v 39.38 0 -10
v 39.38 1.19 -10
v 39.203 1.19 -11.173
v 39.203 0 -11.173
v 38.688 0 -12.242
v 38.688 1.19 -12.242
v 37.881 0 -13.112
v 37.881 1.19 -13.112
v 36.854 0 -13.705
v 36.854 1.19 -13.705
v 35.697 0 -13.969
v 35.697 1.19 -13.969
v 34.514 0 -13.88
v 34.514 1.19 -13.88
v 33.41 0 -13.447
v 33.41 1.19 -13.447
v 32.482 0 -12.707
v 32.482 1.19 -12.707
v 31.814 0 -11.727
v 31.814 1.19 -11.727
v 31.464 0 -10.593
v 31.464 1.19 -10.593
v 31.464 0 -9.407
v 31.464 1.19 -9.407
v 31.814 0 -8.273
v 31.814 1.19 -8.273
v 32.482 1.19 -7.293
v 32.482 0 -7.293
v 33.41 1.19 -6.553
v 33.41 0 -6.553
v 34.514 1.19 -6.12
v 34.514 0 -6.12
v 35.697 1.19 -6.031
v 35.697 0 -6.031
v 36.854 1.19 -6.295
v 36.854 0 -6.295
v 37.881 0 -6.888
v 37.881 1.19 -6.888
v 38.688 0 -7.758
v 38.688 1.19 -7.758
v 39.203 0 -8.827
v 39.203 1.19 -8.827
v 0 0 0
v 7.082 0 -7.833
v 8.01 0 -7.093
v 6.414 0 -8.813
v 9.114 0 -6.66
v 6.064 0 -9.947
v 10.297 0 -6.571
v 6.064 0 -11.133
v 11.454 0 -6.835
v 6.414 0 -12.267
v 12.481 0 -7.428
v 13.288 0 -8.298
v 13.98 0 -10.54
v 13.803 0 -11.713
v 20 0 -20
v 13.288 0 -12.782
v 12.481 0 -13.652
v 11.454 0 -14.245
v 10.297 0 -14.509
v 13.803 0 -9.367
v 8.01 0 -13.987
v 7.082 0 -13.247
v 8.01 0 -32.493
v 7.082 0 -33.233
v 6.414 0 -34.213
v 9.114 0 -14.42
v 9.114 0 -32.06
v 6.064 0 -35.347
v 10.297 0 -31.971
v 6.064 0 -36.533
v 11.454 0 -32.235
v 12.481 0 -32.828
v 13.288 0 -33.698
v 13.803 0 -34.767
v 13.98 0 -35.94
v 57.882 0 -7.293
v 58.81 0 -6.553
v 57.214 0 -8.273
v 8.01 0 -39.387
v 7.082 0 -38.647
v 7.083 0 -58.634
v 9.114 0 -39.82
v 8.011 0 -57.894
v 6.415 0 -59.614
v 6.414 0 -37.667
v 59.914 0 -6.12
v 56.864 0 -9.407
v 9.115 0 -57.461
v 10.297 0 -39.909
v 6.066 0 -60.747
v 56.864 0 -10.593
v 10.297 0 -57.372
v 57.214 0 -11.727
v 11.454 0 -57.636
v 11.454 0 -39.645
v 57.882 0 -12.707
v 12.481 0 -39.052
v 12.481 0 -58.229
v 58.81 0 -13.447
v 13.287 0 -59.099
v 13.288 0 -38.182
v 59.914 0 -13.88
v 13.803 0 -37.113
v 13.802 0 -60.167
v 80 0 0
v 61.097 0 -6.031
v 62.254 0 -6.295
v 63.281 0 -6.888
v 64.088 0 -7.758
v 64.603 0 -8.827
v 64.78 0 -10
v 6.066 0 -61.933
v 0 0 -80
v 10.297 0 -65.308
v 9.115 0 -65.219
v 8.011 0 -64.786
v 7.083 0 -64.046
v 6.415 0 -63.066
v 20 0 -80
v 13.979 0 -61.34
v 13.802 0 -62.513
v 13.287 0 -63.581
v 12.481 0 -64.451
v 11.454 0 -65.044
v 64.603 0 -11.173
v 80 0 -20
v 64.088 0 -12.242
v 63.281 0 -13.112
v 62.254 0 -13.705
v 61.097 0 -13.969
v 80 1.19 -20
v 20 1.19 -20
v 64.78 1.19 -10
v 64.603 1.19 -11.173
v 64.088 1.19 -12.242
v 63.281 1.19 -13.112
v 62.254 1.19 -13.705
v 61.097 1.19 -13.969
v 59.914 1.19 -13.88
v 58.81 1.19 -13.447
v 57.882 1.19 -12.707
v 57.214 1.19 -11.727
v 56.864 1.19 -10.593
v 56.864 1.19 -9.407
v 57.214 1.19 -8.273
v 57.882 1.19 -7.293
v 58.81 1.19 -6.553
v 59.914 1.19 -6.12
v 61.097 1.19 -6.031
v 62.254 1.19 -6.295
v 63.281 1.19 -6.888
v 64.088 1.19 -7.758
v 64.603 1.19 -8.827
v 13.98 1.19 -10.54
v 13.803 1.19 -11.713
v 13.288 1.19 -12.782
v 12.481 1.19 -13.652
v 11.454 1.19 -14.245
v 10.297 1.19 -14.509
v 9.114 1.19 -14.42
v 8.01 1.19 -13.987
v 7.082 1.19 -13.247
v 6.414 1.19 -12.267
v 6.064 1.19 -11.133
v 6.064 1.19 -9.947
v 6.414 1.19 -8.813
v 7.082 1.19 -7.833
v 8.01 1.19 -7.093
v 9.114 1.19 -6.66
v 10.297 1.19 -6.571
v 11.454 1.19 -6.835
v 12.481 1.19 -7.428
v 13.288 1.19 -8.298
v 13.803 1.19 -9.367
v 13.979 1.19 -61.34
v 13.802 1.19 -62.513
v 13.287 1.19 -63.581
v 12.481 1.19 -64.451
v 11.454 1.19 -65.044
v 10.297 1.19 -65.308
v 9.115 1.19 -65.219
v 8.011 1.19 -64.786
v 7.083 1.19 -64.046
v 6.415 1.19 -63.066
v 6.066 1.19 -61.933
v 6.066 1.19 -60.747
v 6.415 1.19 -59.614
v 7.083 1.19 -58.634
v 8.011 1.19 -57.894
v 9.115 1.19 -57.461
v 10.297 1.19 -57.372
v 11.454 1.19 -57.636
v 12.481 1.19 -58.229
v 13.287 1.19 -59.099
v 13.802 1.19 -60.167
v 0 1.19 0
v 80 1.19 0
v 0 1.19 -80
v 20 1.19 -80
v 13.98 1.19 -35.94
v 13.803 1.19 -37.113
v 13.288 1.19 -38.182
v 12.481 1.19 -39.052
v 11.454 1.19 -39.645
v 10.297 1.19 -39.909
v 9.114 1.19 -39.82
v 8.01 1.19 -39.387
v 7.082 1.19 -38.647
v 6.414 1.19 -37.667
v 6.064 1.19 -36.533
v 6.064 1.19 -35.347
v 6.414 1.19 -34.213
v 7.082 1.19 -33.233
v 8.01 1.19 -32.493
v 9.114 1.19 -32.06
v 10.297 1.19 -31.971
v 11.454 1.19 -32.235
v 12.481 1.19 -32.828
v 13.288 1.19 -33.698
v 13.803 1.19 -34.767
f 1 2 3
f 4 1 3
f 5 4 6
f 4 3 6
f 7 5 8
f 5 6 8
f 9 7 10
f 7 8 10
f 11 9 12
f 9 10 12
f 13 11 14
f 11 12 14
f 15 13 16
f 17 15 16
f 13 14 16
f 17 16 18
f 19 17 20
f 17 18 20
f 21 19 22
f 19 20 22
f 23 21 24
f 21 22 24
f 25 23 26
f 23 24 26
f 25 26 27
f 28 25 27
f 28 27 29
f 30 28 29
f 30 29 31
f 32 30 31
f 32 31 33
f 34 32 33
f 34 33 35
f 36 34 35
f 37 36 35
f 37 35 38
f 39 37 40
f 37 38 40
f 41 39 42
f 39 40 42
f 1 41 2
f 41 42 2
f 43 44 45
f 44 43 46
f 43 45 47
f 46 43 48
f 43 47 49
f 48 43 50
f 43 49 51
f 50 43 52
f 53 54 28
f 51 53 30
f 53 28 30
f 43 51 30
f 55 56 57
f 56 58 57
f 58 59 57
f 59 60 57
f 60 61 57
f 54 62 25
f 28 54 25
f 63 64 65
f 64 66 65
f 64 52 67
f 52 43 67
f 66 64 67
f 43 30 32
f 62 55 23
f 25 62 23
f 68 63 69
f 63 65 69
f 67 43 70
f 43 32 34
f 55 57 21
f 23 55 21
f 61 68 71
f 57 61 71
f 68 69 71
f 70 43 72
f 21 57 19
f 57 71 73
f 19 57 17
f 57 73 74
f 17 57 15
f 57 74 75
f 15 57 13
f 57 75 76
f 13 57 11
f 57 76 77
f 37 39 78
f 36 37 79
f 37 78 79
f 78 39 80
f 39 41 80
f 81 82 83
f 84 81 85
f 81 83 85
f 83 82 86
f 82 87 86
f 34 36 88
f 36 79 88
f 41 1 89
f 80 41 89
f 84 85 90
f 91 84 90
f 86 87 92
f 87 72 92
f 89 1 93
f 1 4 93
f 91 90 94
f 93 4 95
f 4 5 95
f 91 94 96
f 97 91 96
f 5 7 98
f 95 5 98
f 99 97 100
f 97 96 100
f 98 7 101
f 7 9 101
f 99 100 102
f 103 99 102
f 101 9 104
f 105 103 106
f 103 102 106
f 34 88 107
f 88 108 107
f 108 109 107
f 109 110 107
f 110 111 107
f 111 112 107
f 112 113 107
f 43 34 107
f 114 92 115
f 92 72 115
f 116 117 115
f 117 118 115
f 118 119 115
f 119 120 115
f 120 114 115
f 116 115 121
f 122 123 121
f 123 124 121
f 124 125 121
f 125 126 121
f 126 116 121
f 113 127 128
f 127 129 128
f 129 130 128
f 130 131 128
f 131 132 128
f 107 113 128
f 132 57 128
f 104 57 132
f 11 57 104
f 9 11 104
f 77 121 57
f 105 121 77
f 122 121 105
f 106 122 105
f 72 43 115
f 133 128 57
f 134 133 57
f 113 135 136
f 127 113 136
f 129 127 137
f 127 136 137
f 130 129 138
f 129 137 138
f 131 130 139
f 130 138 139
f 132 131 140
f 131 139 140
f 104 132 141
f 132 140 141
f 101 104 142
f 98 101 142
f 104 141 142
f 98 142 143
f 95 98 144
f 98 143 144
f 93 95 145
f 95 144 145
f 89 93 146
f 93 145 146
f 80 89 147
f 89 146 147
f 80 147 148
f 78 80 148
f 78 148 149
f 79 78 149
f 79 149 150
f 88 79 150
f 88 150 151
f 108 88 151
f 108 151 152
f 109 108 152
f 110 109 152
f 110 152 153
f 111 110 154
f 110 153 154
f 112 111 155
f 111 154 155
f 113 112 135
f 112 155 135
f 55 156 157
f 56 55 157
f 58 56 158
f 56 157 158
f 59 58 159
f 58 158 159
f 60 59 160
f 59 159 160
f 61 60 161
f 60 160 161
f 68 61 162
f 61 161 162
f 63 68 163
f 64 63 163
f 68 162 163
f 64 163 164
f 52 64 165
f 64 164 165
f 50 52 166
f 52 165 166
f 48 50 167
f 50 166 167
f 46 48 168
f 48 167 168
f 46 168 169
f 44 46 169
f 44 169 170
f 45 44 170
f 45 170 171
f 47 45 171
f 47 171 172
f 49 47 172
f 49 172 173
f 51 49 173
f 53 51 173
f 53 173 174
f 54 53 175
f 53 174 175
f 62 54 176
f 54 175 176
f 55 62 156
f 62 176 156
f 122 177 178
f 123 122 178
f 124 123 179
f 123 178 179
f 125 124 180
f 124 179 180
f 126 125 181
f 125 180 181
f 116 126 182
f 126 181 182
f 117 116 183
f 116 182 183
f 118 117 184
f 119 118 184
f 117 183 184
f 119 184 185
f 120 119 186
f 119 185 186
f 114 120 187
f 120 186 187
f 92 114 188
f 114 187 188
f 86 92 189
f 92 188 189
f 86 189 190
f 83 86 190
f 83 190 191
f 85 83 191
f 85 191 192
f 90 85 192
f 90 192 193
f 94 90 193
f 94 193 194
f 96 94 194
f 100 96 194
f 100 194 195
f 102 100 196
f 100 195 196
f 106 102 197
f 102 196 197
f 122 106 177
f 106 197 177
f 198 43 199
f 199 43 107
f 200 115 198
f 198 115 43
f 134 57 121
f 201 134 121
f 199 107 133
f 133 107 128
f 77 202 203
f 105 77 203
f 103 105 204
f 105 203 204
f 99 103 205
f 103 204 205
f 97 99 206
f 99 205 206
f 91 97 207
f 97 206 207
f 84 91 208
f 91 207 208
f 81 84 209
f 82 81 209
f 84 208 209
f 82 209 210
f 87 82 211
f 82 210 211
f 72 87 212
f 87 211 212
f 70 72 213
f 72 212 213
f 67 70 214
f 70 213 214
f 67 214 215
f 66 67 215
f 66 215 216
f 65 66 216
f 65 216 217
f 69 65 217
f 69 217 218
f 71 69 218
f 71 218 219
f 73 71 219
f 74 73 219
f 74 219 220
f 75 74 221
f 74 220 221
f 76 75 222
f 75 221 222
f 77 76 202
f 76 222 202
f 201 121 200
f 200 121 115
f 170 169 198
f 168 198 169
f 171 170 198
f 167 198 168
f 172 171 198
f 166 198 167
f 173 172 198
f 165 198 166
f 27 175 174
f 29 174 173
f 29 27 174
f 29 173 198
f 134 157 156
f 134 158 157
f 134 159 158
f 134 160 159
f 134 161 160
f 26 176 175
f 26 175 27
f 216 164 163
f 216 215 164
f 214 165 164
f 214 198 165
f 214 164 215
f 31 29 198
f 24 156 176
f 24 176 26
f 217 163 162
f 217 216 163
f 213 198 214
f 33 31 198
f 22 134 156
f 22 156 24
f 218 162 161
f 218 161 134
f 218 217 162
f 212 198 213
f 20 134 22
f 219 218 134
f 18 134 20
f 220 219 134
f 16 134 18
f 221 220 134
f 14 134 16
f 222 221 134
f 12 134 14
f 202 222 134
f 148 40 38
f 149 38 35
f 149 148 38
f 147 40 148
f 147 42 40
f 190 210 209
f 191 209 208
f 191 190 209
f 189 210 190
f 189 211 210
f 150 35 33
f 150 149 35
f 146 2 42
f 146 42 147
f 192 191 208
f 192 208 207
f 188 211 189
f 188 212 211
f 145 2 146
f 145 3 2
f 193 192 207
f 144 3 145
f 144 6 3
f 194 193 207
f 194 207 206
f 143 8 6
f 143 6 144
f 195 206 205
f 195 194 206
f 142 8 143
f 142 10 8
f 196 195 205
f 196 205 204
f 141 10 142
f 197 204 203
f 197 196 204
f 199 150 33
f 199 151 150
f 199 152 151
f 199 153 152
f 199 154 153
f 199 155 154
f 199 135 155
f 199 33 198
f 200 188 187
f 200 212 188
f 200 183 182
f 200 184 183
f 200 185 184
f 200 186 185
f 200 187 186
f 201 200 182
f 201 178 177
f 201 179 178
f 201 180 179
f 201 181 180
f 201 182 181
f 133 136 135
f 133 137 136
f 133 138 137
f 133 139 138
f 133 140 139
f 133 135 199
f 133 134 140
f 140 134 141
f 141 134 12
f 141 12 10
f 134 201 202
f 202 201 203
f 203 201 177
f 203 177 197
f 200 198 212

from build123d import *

# Parameters (mm, degrees)
BOSS_EXTRUDE1_DEPTH = 1.19
SKETCH2_R           = 3.97875
SKETCH2_R_2         = 3.98
CUT_EXTRUDE1_DEPTH  = 1.19


with BuildPart() as part:
    # Sketch1 → Boss-Extrude1 (new body)
    with BuildSketch(Plane(origin=(0, 0, 0), x_dir=(1, 0, 0), z_dir=(0, 1, 0))):
        Polygon((0, 0), (80, 0), (80, 20), (20, 20), (20, 80), (0, 80), align=None)
    extrude(amount=BOSS_EXTRUDE1_DEPTH)

    # Sketch2 → Cut-Extrude1 (cut)
    with BuildSketch(Plane(origin=(0, 1.19, 0), x_dir=(1, 0, 0), z_dir=(0, 1, 0))):
        with Locations((10, 61.34)):
            Circle(SKETCH2_R)
        with Locations((10, 35.94)):
            Circle(SKETCH2_R_2)
        with Locations((10, 10.54)):
            Circle(SKETCH2_R_2)
        with Locations((35.4, 10)):
            Circle(SKETCH2_R_2)
        with Locations((60.8, 10)):
            Circle(SKETCH2_R_2)
    extrude(amount=-CUT_EXTRUDE1_DEPTH, mode=Mode.SUBTRACT)


solid = part.part
